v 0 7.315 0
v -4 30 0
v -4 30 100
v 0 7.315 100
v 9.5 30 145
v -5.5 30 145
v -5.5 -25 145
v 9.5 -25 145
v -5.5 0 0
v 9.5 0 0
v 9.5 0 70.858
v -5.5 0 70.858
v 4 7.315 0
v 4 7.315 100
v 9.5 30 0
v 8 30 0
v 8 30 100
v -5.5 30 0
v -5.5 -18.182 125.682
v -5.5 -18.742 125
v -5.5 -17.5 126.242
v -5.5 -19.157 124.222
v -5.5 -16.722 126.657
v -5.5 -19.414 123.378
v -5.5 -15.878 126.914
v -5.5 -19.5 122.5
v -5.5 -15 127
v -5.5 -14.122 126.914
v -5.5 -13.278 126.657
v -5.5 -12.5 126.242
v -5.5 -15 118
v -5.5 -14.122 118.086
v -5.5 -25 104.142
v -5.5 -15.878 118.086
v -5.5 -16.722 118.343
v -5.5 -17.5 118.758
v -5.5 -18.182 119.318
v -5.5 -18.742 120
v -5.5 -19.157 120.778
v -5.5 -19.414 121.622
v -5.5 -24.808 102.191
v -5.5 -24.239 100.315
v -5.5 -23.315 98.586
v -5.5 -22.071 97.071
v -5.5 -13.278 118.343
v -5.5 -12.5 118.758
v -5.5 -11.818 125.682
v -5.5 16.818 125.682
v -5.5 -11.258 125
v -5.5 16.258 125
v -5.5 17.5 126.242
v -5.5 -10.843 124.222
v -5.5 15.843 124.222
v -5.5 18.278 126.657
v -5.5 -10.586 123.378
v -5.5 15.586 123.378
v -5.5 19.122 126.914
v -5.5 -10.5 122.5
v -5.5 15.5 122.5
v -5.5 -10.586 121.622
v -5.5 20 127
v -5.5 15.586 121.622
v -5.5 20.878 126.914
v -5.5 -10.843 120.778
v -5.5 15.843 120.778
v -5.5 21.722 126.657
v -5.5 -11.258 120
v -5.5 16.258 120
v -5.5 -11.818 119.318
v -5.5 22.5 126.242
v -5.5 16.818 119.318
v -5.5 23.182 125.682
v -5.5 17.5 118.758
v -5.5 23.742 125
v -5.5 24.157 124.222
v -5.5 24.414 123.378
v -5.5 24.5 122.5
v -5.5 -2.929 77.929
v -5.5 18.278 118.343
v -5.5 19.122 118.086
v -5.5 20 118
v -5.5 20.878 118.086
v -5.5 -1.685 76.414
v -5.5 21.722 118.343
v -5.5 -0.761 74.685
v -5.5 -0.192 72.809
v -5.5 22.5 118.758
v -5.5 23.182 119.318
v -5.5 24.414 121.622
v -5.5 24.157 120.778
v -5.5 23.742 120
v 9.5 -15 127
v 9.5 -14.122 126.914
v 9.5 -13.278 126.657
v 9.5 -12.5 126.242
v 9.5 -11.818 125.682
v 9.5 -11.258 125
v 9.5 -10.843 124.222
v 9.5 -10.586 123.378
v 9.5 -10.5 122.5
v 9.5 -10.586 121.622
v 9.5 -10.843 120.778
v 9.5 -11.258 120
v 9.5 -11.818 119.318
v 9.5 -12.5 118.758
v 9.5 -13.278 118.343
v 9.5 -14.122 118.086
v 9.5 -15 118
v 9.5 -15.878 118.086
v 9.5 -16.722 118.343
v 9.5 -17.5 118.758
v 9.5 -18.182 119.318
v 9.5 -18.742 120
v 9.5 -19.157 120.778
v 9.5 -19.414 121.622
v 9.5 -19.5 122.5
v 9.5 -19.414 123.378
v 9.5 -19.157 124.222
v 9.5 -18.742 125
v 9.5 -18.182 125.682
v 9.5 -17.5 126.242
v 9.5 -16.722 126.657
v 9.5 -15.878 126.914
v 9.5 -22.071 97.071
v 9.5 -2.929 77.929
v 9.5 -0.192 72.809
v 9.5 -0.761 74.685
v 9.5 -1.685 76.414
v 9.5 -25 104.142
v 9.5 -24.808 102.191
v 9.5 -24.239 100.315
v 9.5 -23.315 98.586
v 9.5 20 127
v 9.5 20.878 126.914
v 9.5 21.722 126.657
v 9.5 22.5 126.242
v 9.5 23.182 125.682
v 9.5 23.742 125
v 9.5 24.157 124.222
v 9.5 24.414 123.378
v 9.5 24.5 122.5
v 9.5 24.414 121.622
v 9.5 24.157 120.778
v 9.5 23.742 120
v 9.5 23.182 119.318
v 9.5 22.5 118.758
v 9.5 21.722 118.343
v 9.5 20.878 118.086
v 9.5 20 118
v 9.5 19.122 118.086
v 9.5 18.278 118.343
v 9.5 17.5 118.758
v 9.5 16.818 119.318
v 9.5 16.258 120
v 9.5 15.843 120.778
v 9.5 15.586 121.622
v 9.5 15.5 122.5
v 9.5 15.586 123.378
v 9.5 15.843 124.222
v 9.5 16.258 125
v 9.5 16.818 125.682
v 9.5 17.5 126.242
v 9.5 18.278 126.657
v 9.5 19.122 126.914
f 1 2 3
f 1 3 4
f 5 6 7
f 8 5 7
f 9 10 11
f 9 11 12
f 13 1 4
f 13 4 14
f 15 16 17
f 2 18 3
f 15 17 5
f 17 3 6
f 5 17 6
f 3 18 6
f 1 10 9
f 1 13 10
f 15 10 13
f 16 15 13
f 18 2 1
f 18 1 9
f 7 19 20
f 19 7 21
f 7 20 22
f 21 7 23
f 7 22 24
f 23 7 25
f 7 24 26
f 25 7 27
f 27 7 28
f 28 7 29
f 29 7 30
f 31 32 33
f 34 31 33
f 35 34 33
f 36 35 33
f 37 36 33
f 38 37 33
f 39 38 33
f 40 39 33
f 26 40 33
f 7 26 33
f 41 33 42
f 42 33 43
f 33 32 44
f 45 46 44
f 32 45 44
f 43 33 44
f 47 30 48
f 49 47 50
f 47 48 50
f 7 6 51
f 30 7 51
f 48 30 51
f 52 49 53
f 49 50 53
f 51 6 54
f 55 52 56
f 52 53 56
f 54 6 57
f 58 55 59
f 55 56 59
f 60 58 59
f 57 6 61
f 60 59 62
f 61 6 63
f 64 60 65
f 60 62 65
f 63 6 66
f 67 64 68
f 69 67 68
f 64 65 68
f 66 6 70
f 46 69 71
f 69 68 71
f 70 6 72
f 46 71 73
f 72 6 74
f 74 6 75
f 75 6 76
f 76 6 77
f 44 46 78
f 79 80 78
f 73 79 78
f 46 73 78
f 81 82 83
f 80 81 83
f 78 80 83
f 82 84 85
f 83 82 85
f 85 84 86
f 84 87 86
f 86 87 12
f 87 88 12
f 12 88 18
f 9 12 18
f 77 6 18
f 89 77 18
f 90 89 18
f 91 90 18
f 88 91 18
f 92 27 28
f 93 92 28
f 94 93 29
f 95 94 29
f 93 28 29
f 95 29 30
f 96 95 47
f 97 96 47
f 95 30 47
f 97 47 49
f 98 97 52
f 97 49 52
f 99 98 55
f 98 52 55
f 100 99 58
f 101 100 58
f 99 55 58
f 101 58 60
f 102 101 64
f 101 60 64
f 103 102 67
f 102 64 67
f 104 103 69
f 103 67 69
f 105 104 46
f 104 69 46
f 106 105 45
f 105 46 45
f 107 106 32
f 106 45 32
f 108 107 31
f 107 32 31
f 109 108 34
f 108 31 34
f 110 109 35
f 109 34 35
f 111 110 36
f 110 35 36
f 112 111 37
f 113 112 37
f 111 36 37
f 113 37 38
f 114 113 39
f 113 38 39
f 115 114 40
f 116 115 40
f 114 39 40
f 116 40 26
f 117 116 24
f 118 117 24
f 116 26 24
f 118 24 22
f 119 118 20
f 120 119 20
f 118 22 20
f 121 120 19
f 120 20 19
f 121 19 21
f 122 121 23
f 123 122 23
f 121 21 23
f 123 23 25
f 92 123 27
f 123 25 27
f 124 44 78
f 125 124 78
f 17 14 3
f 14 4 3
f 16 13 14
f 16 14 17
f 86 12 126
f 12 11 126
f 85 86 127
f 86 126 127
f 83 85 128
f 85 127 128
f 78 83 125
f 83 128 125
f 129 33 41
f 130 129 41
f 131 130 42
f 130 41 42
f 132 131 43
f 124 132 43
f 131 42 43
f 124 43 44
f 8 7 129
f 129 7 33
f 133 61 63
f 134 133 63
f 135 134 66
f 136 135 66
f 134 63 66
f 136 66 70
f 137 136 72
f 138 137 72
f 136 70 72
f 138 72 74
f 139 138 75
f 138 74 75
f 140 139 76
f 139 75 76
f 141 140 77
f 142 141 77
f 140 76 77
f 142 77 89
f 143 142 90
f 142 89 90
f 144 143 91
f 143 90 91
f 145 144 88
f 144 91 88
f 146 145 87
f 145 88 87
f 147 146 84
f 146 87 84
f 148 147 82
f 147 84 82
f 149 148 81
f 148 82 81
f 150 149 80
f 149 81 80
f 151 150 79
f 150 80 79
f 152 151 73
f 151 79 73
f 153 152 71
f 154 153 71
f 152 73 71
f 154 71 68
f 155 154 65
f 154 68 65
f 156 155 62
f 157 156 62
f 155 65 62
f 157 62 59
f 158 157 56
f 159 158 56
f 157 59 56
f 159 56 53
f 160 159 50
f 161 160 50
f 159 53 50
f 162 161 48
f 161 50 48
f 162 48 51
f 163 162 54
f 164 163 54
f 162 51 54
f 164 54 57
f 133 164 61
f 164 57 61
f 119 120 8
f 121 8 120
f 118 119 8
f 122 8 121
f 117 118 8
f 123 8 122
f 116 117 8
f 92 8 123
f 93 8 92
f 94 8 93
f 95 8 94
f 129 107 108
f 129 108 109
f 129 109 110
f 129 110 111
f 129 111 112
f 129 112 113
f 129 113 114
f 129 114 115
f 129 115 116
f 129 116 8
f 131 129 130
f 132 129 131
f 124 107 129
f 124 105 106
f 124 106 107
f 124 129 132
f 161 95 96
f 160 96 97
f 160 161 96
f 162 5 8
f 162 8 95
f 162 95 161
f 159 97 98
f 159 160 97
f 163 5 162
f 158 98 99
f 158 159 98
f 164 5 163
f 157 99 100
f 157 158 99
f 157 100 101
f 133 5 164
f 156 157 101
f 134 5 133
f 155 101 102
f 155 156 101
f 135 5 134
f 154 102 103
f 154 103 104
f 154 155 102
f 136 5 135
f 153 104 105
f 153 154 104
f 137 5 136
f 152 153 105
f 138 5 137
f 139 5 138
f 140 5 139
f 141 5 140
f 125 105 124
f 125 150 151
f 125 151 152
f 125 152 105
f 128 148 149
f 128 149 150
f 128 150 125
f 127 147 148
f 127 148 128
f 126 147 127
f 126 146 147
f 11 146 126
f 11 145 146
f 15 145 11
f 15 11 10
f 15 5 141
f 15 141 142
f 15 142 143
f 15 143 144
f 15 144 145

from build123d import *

# Parameters (mm, degrees)
AUFSATZ_LINEAR_AUSTRAGEN1_DEPTH = 100
SKIZZE4_R                       = 4.5
AUFSATZ_LINEAR_AUSTRAGEN2_DEPTH = 15
VERRUNDUNG1_R                   = 10


with BuildPart() as part:
    # Skizze1 → Aufsatz-Linear austragen1 (new body)
    with BuildSketch(Plane.XY):
        Polygon((-5.5, 0), (-5.5, 30), (-4, 30), (0, 7.314872722), (4, 7.314872722), (8, 30), (9.5, 30), (9.5, 0), align=None)
    extrude(amount=AUFSATZ_LINEAR_AUSTRAGEN1_DEPTH)

    # Skizze4 → Aufsatz-Linear austragen2 (add)
    with BuildSketch(Plane.ZY.offset(5.5)):
        with BuildLine():
            Line((100, 30), (145, 30))
            Line((145, 30), (145, -25))
            Line((145, -25), (104.142135624, -25))
            ThreePointArc((104.142135624, -25), (100.3153013, -24.238795325), (97.071067812, -22.071067812))
            Line((97.071067812, -22.071067812), (75, 0))
            Line((75, 0), (100, 0))
            Line((100, 0), (100, 30))
        make_face()
        with Locations((122.5, 20)):
            Circle(SKIZZE4_R, mode=Mode.SUBTRACT)
        with Locations((122.5, -15)):
            Circle(SKIZZE4_R, mode=Mode.SUBTRACT)
    extrude(amount=-AUFSATZ_LINEAR_AUSTRAGEN2_DEPTH)

    # Verrundung1
    verrundung1_edges = [part.edges().sort_by_distance(p)[0] for p in [
        (2, 0, 75),
    ]]
    fillet(verrundung1_edges, radius=VERRUNDUNG1_R)


solid = part.part
